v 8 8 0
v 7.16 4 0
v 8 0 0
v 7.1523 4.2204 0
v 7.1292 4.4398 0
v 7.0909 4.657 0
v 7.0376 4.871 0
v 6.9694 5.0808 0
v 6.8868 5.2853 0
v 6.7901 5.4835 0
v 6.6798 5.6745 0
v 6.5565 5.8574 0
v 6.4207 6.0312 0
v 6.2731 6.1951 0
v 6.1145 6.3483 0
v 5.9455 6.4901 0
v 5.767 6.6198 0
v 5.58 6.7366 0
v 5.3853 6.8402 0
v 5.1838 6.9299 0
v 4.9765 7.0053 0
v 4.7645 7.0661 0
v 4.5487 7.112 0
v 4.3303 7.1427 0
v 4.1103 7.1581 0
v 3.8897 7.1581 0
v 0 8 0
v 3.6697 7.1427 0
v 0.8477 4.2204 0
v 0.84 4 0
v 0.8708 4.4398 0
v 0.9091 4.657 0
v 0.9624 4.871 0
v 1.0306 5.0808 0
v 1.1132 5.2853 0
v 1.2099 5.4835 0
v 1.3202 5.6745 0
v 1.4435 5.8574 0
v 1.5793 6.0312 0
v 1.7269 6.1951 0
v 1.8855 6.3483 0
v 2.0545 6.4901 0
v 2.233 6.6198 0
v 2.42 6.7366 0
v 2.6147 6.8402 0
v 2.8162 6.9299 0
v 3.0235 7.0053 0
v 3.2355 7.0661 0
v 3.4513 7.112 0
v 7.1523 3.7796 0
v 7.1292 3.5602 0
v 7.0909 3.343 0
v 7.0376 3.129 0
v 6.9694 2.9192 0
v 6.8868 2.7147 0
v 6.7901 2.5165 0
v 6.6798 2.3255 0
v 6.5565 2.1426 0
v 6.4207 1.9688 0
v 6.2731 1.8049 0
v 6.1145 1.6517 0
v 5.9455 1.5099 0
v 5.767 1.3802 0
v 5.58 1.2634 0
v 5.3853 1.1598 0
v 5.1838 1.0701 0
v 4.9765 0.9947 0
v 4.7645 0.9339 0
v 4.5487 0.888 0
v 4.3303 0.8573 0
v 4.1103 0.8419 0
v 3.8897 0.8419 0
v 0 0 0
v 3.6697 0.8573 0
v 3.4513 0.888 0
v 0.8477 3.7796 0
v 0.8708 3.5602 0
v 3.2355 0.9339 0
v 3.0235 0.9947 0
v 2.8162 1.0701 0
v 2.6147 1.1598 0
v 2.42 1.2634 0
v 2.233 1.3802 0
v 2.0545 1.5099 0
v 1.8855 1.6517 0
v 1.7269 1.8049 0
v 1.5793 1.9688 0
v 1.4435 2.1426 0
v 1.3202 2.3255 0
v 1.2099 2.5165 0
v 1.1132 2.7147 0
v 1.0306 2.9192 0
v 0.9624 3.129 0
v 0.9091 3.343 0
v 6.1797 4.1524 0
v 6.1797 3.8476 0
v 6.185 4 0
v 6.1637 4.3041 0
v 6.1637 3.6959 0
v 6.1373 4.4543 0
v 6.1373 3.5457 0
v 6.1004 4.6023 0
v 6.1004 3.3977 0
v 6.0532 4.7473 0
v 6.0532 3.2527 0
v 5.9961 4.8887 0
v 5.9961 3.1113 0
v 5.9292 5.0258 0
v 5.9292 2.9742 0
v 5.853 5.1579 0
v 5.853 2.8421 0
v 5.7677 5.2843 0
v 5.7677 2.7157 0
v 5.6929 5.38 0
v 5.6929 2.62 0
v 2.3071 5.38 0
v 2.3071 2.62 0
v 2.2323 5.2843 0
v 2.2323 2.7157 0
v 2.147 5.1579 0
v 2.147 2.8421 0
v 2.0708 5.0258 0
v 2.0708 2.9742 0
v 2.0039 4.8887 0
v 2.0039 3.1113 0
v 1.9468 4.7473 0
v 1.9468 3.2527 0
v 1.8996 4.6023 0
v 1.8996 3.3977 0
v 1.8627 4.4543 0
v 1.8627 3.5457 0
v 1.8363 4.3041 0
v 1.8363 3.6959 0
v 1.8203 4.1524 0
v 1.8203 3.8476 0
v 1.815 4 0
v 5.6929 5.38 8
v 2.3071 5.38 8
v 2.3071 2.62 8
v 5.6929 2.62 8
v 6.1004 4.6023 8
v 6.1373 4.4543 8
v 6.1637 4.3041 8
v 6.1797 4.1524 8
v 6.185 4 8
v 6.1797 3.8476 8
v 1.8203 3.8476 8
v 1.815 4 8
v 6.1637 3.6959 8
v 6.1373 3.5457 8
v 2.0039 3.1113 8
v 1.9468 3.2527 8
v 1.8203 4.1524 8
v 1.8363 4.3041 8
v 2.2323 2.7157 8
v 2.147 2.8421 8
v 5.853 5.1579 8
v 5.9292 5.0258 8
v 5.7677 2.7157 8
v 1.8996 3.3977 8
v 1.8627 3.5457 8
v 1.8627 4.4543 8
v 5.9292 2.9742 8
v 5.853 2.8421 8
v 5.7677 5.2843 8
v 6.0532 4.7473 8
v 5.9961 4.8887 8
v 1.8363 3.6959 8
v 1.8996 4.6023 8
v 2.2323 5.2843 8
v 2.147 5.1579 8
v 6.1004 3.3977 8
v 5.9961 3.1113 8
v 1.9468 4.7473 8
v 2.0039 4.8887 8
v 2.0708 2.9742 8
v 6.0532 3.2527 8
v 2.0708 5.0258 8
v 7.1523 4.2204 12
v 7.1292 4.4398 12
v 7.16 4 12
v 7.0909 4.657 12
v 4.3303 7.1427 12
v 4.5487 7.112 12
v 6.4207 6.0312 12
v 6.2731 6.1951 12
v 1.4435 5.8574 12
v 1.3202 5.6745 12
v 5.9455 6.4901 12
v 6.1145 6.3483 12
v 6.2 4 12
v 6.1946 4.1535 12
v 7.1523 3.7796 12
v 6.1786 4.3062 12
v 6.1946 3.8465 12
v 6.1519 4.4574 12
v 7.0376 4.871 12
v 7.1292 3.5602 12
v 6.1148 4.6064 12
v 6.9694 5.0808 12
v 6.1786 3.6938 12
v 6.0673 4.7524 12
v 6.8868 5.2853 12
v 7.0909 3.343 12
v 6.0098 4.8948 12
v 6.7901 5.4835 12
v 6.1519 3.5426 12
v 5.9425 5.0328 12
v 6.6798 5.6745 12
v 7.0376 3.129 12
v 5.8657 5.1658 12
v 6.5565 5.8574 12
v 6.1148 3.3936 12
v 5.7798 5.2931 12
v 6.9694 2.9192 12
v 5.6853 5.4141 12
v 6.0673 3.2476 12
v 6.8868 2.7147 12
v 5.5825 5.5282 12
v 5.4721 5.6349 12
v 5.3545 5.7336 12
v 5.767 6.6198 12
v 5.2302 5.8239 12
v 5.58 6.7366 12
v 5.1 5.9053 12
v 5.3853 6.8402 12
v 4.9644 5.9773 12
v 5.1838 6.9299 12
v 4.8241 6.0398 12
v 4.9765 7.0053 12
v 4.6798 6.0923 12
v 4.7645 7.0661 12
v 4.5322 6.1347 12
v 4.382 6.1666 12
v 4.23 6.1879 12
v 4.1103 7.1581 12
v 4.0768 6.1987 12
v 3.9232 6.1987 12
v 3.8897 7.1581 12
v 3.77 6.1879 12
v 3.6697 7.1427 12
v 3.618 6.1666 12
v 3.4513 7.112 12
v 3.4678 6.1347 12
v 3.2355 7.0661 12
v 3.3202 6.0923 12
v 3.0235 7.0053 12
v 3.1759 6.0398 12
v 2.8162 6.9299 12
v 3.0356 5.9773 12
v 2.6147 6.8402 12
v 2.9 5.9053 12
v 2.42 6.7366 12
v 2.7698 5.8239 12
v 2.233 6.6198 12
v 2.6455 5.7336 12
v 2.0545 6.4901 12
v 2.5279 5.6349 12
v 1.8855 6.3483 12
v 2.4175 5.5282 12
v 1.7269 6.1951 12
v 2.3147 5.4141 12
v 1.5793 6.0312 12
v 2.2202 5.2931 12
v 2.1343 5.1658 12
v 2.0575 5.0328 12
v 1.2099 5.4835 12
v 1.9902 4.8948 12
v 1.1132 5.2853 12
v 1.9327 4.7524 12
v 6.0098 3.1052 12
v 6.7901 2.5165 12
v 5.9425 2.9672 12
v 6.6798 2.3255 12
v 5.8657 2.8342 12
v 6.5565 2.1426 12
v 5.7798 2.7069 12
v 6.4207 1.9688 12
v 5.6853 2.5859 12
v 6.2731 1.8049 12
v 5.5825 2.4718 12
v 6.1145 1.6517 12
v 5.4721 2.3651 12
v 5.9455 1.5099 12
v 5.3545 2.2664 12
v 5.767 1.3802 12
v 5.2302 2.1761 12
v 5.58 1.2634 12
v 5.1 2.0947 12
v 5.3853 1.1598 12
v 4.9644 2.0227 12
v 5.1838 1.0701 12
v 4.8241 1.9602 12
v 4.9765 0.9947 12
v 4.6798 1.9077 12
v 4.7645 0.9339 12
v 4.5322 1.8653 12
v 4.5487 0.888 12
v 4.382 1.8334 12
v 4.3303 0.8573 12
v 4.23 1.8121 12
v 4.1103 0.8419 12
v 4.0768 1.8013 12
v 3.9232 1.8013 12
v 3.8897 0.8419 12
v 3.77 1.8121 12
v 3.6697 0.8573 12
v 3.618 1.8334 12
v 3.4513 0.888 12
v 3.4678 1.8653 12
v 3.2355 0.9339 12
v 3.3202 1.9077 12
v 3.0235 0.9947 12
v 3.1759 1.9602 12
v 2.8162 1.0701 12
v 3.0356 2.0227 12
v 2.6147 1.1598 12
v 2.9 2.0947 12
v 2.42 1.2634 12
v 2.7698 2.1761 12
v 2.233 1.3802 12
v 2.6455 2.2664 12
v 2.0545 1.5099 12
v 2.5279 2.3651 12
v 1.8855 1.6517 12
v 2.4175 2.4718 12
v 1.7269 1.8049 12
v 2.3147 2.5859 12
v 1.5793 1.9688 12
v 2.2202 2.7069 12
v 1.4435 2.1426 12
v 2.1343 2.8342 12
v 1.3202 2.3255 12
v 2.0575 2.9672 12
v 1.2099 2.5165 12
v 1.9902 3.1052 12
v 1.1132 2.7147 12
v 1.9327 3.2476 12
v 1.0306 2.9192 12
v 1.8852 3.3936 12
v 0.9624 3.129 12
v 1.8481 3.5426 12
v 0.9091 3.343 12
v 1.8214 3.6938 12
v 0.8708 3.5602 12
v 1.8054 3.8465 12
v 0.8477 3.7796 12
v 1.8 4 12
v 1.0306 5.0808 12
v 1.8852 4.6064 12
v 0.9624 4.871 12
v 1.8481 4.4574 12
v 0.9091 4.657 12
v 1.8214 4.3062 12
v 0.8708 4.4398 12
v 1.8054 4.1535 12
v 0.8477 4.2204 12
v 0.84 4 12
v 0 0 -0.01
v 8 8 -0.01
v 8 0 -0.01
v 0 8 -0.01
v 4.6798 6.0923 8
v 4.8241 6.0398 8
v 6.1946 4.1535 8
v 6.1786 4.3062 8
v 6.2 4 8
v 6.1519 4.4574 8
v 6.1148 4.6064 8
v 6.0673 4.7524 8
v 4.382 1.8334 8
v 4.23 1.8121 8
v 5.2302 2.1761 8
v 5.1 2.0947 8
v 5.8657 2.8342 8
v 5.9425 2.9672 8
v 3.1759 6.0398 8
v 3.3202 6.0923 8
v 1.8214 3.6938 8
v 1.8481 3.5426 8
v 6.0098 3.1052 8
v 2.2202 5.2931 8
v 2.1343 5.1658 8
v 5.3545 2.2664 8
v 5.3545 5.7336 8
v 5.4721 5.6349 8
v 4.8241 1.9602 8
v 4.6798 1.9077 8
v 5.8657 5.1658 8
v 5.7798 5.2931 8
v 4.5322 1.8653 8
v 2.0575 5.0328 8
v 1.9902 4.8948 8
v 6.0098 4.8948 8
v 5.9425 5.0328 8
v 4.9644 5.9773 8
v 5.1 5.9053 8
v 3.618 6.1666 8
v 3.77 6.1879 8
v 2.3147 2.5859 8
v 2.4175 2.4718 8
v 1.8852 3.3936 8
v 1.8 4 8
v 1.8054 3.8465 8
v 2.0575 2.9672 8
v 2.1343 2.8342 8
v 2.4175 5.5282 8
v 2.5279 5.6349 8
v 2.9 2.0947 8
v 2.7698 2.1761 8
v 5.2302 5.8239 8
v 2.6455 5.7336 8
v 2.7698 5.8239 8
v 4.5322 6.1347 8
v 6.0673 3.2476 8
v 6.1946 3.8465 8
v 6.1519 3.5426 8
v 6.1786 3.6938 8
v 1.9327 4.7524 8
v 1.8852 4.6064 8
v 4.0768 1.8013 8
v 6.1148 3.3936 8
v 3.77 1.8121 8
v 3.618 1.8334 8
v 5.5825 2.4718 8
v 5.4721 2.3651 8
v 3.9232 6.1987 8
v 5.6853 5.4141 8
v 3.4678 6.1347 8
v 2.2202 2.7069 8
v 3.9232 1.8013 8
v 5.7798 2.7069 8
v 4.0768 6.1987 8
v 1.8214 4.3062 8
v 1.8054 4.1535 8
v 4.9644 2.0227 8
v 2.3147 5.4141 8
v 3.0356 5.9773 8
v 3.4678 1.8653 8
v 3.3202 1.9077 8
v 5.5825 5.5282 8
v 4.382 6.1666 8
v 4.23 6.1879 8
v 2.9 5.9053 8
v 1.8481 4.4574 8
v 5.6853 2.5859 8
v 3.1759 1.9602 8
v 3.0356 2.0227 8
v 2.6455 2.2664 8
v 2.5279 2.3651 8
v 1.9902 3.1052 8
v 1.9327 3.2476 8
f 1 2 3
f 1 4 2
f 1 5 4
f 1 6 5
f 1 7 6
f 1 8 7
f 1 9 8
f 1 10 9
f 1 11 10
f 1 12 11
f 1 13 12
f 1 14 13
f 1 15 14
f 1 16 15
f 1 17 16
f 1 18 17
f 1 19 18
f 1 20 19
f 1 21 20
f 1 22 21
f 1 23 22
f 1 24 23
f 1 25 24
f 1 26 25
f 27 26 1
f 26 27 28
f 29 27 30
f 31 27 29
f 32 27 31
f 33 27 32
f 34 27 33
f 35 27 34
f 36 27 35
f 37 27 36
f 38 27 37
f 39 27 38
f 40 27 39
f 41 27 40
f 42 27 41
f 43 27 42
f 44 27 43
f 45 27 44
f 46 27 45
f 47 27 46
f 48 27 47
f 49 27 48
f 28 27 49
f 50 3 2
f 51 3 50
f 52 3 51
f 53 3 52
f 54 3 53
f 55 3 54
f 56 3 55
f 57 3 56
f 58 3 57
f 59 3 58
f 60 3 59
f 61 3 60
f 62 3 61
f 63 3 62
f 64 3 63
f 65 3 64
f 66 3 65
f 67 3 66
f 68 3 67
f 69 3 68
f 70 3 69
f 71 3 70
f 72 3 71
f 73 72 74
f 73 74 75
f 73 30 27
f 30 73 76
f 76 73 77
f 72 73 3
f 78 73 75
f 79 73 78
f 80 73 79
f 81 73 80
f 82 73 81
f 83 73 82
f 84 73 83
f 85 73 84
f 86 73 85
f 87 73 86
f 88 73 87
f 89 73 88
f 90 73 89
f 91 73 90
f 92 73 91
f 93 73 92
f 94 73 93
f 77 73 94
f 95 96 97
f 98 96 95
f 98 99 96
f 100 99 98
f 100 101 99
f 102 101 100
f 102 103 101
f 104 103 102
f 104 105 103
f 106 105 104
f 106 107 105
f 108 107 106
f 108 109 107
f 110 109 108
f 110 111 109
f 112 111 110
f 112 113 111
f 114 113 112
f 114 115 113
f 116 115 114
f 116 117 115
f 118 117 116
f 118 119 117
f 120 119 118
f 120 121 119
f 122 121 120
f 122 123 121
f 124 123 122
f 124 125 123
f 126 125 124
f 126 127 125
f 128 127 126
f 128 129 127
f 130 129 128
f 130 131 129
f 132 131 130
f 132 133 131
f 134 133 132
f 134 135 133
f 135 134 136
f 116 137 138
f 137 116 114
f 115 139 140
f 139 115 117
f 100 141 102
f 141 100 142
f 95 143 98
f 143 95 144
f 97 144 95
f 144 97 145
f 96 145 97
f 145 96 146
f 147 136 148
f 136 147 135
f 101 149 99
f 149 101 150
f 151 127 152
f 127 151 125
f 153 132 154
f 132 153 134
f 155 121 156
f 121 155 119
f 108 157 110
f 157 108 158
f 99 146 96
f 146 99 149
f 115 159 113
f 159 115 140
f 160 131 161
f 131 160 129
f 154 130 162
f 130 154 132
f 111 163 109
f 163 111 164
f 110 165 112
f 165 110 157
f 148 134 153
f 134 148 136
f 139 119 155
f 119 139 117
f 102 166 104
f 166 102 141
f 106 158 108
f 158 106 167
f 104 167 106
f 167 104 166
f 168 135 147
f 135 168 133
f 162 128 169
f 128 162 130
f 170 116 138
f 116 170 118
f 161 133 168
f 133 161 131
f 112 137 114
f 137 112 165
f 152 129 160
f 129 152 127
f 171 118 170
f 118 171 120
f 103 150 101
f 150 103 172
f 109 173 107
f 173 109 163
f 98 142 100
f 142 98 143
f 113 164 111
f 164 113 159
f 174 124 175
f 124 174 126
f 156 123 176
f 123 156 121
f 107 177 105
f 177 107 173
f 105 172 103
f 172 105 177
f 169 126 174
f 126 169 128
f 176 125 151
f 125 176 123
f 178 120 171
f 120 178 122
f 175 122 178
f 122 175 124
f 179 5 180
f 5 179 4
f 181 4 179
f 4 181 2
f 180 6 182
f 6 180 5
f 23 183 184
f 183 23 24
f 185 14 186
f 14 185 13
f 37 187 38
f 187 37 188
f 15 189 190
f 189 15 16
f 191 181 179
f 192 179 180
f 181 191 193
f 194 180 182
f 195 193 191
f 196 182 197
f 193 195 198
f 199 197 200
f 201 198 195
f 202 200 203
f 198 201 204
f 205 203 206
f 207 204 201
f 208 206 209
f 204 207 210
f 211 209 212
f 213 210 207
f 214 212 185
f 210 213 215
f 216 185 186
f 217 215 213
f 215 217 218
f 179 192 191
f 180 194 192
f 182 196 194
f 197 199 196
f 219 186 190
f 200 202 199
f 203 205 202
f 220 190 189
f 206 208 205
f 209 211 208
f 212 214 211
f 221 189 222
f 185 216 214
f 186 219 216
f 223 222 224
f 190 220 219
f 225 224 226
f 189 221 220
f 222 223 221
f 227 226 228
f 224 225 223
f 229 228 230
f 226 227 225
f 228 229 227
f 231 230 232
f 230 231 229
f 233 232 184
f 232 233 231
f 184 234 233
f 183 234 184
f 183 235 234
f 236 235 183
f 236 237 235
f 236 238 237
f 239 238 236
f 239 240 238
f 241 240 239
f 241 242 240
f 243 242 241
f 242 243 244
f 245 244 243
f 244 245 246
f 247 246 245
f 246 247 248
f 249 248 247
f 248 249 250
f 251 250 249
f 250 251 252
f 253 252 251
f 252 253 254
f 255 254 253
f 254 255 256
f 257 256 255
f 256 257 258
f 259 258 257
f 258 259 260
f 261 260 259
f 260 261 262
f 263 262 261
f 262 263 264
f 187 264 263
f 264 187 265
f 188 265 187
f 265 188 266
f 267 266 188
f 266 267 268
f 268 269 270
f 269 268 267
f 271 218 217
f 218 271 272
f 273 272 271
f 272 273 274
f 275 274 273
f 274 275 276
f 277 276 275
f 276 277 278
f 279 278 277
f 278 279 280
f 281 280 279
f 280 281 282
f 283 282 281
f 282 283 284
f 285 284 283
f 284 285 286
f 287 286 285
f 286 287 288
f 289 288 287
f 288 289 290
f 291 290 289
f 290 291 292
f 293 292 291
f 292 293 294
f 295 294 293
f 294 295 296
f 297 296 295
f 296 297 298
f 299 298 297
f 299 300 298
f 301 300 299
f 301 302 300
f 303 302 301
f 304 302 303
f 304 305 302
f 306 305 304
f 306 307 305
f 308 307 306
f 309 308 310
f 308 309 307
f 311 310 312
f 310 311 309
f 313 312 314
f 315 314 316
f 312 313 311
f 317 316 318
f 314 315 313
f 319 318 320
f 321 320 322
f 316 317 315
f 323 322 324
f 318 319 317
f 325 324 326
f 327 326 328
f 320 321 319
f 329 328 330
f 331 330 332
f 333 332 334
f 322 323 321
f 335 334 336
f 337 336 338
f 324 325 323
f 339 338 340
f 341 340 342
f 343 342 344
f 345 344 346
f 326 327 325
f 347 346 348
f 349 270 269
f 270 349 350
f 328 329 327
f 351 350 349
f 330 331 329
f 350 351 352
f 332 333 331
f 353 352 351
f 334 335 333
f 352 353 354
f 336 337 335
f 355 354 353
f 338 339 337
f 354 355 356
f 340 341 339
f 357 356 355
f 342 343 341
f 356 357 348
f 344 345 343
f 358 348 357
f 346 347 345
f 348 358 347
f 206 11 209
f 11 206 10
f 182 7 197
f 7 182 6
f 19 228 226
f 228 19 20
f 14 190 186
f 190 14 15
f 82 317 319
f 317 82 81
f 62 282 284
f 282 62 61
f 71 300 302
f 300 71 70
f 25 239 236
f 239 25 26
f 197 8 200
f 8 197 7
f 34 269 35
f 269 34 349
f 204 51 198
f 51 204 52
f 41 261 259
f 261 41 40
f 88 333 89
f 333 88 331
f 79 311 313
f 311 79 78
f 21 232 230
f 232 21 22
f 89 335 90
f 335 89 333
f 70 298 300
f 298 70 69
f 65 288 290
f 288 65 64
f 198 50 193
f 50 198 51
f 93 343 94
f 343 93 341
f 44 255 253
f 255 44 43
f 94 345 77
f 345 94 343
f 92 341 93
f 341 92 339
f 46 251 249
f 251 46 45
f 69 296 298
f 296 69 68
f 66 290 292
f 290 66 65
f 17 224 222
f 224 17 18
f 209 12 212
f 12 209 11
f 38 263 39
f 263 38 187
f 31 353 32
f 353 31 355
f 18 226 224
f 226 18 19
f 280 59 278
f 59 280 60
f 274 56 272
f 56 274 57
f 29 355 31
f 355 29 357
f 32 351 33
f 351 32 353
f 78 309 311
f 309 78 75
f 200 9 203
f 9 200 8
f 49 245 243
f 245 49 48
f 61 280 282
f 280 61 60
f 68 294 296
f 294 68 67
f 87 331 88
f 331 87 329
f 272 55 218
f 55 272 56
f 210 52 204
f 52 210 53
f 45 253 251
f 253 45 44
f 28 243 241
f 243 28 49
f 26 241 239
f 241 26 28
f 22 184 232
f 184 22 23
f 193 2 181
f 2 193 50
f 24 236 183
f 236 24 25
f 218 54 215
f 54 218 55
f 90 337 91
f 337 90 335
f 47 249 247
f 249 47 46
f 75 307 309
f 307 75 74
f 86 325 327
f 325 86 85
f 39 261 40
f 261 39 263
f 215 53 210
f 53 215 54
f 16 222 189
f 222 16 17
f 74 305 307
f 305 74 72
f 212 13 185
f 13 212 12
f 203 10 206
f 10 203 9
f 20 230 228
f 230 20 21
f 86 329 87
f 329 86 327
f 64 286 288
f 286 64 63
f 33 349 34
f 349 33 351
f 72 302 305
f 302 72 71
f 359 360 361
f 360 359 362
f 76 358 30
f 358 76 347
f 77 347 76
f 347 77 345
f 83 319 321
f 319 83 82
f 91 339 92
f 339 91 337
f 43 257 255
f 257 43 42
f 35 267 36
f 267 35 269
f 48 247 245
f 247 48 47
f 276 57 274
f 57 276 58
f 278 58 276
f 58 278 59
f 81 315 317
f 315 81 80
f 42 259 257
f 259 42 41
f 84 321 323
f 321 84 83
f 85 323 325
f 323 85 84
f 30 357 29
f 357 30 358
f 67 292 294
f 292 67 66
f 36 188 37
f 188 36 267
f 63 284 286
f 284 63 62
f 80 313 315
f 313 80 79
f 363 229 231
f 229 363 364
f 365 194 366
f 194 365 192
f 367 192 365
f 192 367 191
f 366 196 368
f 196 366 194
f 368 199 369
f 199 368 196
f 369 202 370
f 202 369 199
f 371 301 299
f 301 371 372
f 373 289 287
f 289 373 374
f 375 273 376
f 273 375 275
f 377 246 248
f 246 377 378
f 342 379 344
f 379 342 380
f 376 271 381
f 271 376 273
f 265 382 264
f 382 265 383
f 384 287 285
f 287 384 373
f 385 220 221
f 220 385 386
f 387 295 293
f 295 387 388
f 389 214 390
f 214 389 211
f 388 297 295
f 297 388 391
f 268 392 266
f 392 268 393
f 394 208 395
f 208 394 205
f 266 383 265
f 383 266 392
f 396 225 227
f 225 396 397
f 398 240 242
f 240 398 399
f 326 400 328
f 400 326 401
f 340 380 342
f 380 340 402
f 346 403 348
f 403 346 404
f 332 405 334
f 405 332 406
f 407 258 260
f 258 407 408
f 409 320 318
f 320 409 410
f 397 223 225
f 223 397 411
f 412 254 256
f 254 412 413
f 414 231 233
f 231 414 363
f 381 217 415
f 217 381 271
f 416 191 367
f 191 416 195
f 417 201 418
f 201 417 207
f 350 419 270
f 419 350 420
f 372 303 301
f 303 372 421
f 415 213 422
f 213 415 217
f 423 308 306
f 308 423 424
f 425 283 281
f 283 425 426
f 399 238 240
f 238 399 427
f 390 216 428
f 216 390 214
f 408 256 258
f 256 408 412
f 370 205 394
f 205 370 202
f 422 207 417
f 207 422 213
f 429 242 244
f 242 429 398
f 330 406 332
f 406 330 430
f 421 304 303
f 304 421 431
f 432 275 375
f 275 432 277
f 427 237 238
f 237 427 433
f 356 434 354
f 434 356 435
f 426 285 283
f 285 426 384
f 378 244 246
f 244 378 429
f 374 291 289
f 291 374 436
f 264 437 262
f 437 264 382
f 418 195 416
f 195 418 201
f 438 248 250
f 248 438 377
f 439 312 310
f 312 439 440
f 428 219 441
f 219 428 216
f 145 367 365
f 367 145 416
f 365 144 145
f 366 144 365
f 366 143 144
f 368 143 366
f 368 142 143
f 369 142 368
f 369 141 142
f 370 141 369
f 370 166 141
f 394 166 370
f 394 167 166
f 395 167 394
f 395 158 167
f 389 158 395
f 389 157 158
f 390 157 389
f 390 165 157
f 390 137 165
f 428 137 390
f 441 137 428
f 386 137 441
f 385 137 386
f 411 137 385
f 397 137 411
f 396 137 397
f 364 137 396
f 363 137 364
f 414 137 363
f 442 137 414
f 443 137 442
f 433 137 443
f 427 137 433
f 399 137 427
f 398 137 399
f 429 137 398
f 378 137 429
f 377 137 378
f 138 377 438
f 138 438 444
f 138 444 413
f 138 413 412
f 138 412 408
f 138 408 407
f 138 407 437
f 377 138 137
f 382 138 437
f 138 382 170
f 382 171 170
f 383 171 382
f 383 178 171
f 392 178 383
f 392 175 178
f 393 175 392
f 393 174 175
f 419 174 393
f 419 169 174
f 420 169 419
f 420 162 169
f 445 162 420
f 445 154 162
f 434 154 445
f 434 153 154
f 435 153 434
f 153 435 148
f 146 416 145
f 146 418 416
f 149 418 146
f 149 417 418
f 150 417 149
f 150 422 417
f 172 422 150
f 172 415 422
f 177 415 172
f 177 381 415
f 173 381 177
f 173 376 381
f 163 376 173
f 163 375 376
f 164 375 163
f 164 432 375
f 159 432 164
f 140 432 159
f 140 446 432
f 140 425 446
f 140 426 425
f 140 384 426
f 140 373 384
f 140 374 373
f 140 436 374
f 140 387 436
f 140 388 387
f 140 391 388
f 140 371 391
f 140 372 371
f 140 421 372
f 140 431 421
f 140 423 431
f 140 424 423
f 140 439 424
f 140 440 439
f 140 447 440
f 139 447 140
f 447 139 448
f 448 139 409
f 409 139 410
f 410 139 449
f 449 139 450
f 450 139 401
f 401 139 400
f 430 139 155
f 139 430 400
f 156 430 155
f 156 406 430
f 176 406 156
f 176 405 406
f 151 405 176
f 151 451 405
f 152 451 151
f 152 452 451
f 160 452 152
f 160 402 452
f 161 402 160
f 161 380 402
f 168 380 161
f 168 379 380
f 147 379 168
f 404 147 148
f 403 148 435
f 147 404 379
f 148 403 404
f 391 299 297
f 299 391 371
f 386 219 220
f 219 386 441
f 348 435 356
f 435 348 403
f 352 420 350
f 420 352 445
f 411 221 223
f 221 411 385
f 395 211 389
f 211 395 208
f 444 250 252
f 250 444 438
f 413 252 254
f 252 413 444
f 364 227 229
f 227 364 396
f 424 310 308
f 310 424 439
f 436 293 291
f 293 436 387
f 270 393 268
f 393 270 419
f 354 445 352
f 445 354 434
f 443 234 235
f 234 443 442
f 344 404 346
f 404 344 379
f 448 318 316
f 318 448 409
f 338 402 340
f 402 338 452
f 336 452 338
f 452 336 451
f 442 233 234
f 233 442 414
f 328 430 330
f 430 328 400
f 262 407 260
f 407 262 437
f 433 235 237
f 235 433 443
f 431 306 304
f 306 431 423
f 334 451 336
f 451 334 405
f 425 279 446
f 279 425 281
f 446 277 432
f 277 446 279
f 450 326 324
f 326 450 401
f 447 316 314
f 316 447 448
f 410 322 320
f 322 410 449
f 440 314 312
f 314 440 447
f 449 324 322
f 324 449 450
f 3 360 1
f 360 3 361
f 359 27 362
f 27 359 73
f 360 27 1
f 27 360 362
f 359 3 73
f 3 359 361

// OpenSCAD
// file: ../Base/PlacementOptions.scad
// Fischertechnik Box Foundation
// Placement Options

// Alignment
NoAlign = 0;
AlignLeft = 1;
AlignBottom = 2;
AlignCenter = 3;
AlignRight = 4;
AlignTop = 5;

// Element rotation degree steps
rotations = [0, -90, -180, -270];

// Rotation
NoRotation = 0;
Rotate0 = 0;
Rotate90 = 1;
Rotate180 = 2;
Rotate270 = 3;

// Docking (seen from above)
NoDock = -1;
DockLeft = 0;
DockTop = 1;
DockRight = 2;
DockCorner = 2;
DockBottom = 3;

// Web corners
LowerLeft = 0;
UpperLeft = 1;
UpperRight = 2;
LowerRight = 3;

// Web position relative to corner
LeftOfCorner = 0;
RightOfCorner = 1;

// Rails direction
Horizontal = true;
Vertical = false;
// file: ../Base/Boxes.scad
// Fischertechnik Box Foundation
// Pre-designed Boxes

use <Constants.scad>

include <PlacementOptions.scad>

box190Width = 190;
box190Depth = 130;
box130Width = 130;
box130Depth = 95;

// Values are from an original ec3 box
topBottomDifference = 1.5;
outerHeight = 40;
baseThickness = 1.8;
innerHeight = outerHeight - baseThickness;
stackExcess = 5.7;
radius = 3.5;
wallThickness = 1.5;
tolerance = 0.2;

boxWallThickness = wallThickness;
boxBaseThickness = baseThickness;
boxWebWidth = 3.0;

// getBoxWallThickness()
// Gets the wall thickness of a Fischertechnik Box
function getBoxWallThickness() = boxWallThickness;

// getBoxUsageHeight(height = 38.2)
// Gets the usable height of a Fischertechnik box
// height = Outer height of the box from the bottom to the upper edge.
function getBoxUsageHeight(height = outerHeight) = height - baseThickness - stackExcess;

// getBoxInnerHeight()
// Gets the inner height of a Fischertechnik box, including the stack excess
function getBoxInnerHeight() = innerHeight;

// getBoxBaseThickness()
// Gets the thickness of the Fischertechnik box base.
function getBoxBaseThickness() = boxBaseThickness;

// getBoxWebWidth()
// Gets the width of a box web
function getBoxWebWidth() = boxWebWidth;

// getBox190Space()
// Gets the usable inner space of a Box 190 as an x/y-list
function getBox190Space() = [
    box190Width - 2*getBoxWallThickness() - topBottomDifference, 
    box190Depth - 2*getBoxWallThickness() - topBottomDifference ];

// RoundedCornerPlate(width, depth, height, radius)
// Creates a body plate with rounded corners for a box. Used
// also to create the complete box with the hull module.
// width = Width of the plate
// depth = depth of the plate 
// height = thickness of the plate
// radius = radius of the rounded corner
module RoundedCornerPlate(width, depth, height, radius) {
    translate([radius, radius])
    hull() {
        w = width-2*radius;
        d = depth-2*radius;
        cube([w, d, height]);
        cylinder(height, r=radius, $fn=getFragments());
        translate([w, 0])
            cylinder(height, r=radius, $fn=getFragments());
        translate([w, d])
            cylinder(height, r=radius, $fn=getFragments());
        translate([0, d])
            cylinder(height, r=radius, $fn=getFragments());
    }
}

// BoxBase(width, depth)
// Creates an empty stackable Fischertechnik compatible box
// width = Outer width of the box (190, 130, ...)
// depth = Outer depth of the box (130, 95, ...)

module BoxBase(width, depth, height=outerHeight) {    
    thinPlate = 0.01;

    innerHeight = height - baseThickness;    
    
    module Body(tolerance=tolerance) {
        hull() {
            // Bottom with tolerance to fit into the original boxes when stacked
            translate([-wallThickness+tolerance, -wallThickness+tolerance, -baseThickness])
                RoundedCornerPlate(width-topBottomDifference-2*tolerance, depth-topBottomDifference-2*tolerance, thinPlate, radius);
            
            // Top
            translate([-wallThickness-topBottomDifference/2, -wallThickness-topBottomDifference/2, innerHeight-thinPlate])
                RoundedCornerPlate(width, depth, thinPlate, radius);
         }
    }

    module Cutoff() {
        hull() {
            coWidth = width - 2*wallThickness;
            coDepth = depth - 2*wallThickness;
            
            // Bottom
            RoundedCornerPlate(coWidth-topBottomDifference, coDepth-topBottomDifference, thinPlate, radius);

            // Top
            translate([-topBottomDifference/2, -topBottomDifference/2, innerHeight+thinPlate]) 
                RoundedCornerPlate(coWidth, coDepth, thinPlate, radius);
        }
    }
    
    difference() {        
        Body();
        Cutoff();
        stackOffset = innerHeight - stackExcess;
        translate([0, 0, stackOffset + baseThickness])
            Body(tolerance=0);
    }
}

// Creates the Fischertechnik empty box 130x190 mm and places it at position 0,0
// 190x130 are the outer sizes, the inner space is slightly smaller. Use getBox190Space() to get the inner sizes.
// The box is positioned that the usable inner space is at the 0,0,0 position.

module Box190() {
    BoxBase(box190Width, box190Depth);
}

// Gets the usable inner space of a Box 130 as an x/y-list
function getBox130Space() = [
    box130Width - 2*getBoxWallThickness() - topBottomDifference, 
    box130Depth - 2*getBoxWallThickness() - topBottomDifference ];

// Creates the Fischertechnik empty box 95x130 mm and places it at position 0,0
// 190x130 are the outer sizes, the inner space is slightly smaller. Use getBox190Space() to get the inner sizes.
// The box is positioned that the usable inner space is at the 0,0,0 position.

module Box130() {
    BoxBase(box130Width, box130Depth);
}

// Creates a web at the specified box walls
// corner 0 = LowerLeft, 1 = UpperLeft, 2 = UpperRight, 3 = LowerRight
// side 0 = LeftOfCorner, 1 = RightOfCorner
// distance = Distance in mm from the corner
// boxSpace = inner width and depth of the box (default: Box 190)
// webWidth = length of the web (default is 3 mms)
// webThickness = thickness of the web (default is 1 mm)
// height = Height of the web (standard is getBoxUsageHeight())
// sink = How much of the web is sunk into the wall

module BoxWeb(
    corner, 
    side, 
    distance, 
    boxSpace=getBox190Space(), 
    webWidth=getBoxWebWidth(), 
    webThickness=1.0, 
    height=getBoxUsageHeight(),
    sink = getBoxWallThickness()/2) {
    width = (corner % 2 == 0) ? 
            (side == LeftOfCorner ? webWidth : webThickness) :
            (side == LeftOfCorner ? webThickness : webWidth);

    depth = (corner % 2 == 0) ? 
            (side == RightOfCorner ? webWidth : webThickness) :
            (side == RightOfCorner ? webThickness : webWidth);
    
    xDiff = corner == LowerLeft ? 
                (side == LeftOfCorner ? -sink : distance) :
            (corner == UpperLeft ?                
                (side == LeftOfCorner ? distance : -sink) :
            (corner == UpperRight ?
                (side == LeftOfCorner ? boxSpace.x-webWidth+sink : boxSpace.x-distance-webThickness) :
                (side == LeftOfCorner ? boxSpace.x-distance-webThickness: boxSpace.x-webWidth+sink)));

    yDiff = corner == LowerLeft ? 
                (side == RightOfCorner ? -sink : distance) :
            (corner == UpperLeft ?
                (side == RightOfCorner ? boxSpace.y-distance-webThickness : boxSpace.y-webWidth+sink) :
            (corner == UpperRight ?
                (side == RightOfCorner ? boxSpace.y-webWidth+sink : boxSpace.y-distance-webThickness) :
                (side == RightOfCorner ? distance : -sink)));
    
    translate([xDiff, yDiff, -getExcess()])
        cube([width, depth, height + 2*getExcess()]);
}
// file: ../Base/Rotation.scad
// Fischertechnik Box Foundation
// Geometry Helpers Rotation

include <PlacementOptions.scad>

// getRotatedSpace(space, rotation=NoRotation)
// Rotates the space dependent on the specified rotation

function getRotatedSpace(space, rotation=NoRotation) = [
    (rotation == Rotate90 || rotation == Rotate270) ? space.y : space.x,
    (rotation == Rotate90 || rotation == Rotate270) ? space.x : space.y
];

// Rotates the given space around the fixed left lower corner
// space = the space the children needs as width/depth list [width,depth]
// rotation = 0 Rotate0 degrees, 1 Rotate90 degrees, 2 Rotate180 degrees, 3 Rotate270 degrees (equivalent to -90)

module RotateFix(space, rotation=NoRotation) {
    dy = (rotation == Rotate0 || rotation == Rotate270) ? 0 :
        (rotation == Rotate90) ? space.x :
        space.y;
    dx = (rotation < Rotate180) ? 0 :
        (rotation == Rotate180) ? space.x :
        space.y;
    
    translate([dx, dy, 0])
        rotate([0, 0, rotations[rotation]])
            children();
}
// file: ../Base/Alignment.scad
// Fischertechnik Box Foundation
// Geometry Helpers Alignment

include <PlacementOptions.scad>

// getAlignedX(elementWidth, spaceWidth, align=AlignRight, offset=0)
// Gets the aligned X offset of an element with the given
// width in the given space.
// elementWidth = The width of the element to positon
// spaceWidth = The space where the element should be aligned
// align = 0 AlignLeft, 1 AlignCenter, 2 AlignRight
// offset = an optional offset from the aligned position. When
// aligned left or centered, then positive values are in X direction.
// When aligned right then positive values are in negative X direction.

function getAlignedX(elementWidth, spaceWidth, align=AlignRight, offset=0) =
    (align == AlignLeft) ?
        offset :
        ((align == AlignCenter) ?
        (spaceWidth - elementWidth)/2 + offset :
        spaceWidth - offset - elementWidth);

// getAlignedY(elementDepth, spaceDepth, align=AlignTop, offset=0)
// Gets the aligned Y offset of an element with the given
// depth in the given space.
// elementDepth = The depth of the element to positon
// spaceDepth = The space where the element should be aligned
// align = 0 AlignBottom, 1 AlignCenter, 2 AlignTop
// offset = an optional offset from the aligned position. When
// aligned bottom or centered, then positive values are in Y direction.
// When aligned top then positive values are in negative Y direction.

function getAlignedY(elementDepth, spaceDepth, align=AlignTop, offset=0) =
    (align == AlignBottom) ?
        offset :
        ((align == AlignCenter) ?
        (spaceDepth - elementDepth)/2 + offset :
        spaceDepth - offset - elementDepth);
// file: ../Base/Placement.scad
// Fischertechnik Box Foundation
// Geometry Helpers Placement

use <Constants.scad>
use <Alignment.scad>
use <Rotation.scad>
use <Boxes.scad>

include <PlacementOptions.scad>

// Place(x=0, y=0, elementSpace=[0,0], alignX=AlignLeft, alignY=AlignBottom, rotation=Rotate0, boxSpace=getBox190Space())
// Places the child at the specified position
// y = Y-Position. This is a relative position when an X aligment is specified.
// x = X-Position. This is a relative position when an Y aligment is specified.
// elementSpace = space of the element to be placed [x,y]
// alignX = -1=NoAlign, 0 AlignLeft, 1 AlignCenter, 3 AlignRight (elementSpace and boxSpace required!)
// alignY = -1=NoAlign, 2 AlignBottom, 1 AlignCenter, 4 AlignTop (elementSpace and boxSpace required!)
// rotation = 0 Rotate0 0 degrees, 1 Rotate90 90 degrees, 
// 2 Rotate180 180 degrees, 3 Rotate270 270 degrees (equivalent to -90)
// boxSpace = Inner space of the box where the placement occurs [x,y] - default is Box 190x130 inner space

module Place(x=0, y=0, elementSpace=[0,0], 
  alignX=AlignLeft, alignY=AlignBottom, 
  rotation=NoRotation, boxSpace=getBox190Space()) {

    module Position(x, y, space, rotation=Rotate0) {
        translate([x, y, 0])
            RotateFix(space, rotation)
                children();
    }

    space = getRotatedSpace(elementSpace, rotation);
    alignedX = getAlignedX(space.x, boxSpace.x, alignX, x);
    alignedY = getAlignedY(space.y, boxSpace.y, alignY, y);
    Position(alignedX, alignedY, elementSpace, rotation)
        children();
}

// Center(space=getBox130Space(), elementSpace=[0,0])
// space = Space where the children is centered. For cylinder use centered=true and no elementSpace.
// elementSpace = space of the element to be centered [x,y]

module Center(space=getBox190Space(), elementSpace=[0,0]) {
    Place(elementSpace=elementSpace, boxSpace=space, alignX=AlignCenter, alignY=AlignCenter)
        children();
}

// CenterHorizontal(width=0, y=0, offset=0, space=getBox130Space())
// width = Width of the element to be placed.
// y = Y position of the element
// offset = Offset from the center position (negative will be left of the center)
// space = Space where the element is placed

module CenterHorizontal(width=0, y=0, offset=0, space=getBox190Space()) {
    Place(x=offset, y=y, elementSpace=[width, 0], boxSpace=space, alignX=AlignCenter)
        children(0);
}

// CenterVertical(depth=0, x=0, offset=0, space=getBox130Space())
// depth = Depth of the element to be placed.
// x = X position of the element
// offset = Offset from the center position (negative will be down of the center)
// space = Space where the element is placed

module CenterVertical(depth=0, x=0, offset=0, space=getBox190Space()) {
    Place(x=x, y=offset, elementSpace=[0, depth], boxSpace=space, alignY=AlignCenter)
        children(0);
}

// getIsVertical(align)
// True if the specified alignment needs a vertical orientation for a divider (AlignRight, AlignLeft)

function getIsVertical(align) = (align == AlignRight || align == AlignLeft);

// getIsHorizontal(align)
// True if the specified alignment needs a horizontal orientation for a divider (AlignTop, AlignBottom)

function getIsHorizontal(align) = (align == AlignTop || align == AlignBottom);
// file: ../Base/Constants.scad
// Fischertechnik Box Foundation
// Constants

// Constant values necessary for multiple elements

// Base constants
dividerThickness = 1.2;
excess = 0.01;
fragments = 90;
tolerance = 0.8;

// Gets the thickness of a divider 
function getDividerThickness() = dividerThickness;

// Gets the excess that is used to merge walls into each other
function getExcess() = excess;

// Gets amount of fragments of a cylinder
function getFragments() = fragments;

// Gets the inner tolerance of a frame to each side
function getTolerance() = tolerance;


// Fischertechnik specific constants
axisDiameter = 4;
axisBottomDiameter = axisDiameter + 1;
axisTolerance = 0.2;
axisLockingLength = 8;

// Gets axis diameter of Fischertechnik axis
function getAxisDiameter() = axisDiameter;

// Gets axis diameter tolerance (subtracted for element axis)
function getAxisTolerance() = axisTolerance;

// Gets the axis diameter for standing axis
function getStandAxisDiameter() = getAxisDiameter() - getAxisTolerance();

// Gets axis bottom diameter for thicker part at the bottom
function getAxisBottomDiameter() = axisBottomDiameter;

// Gets the lengthh of the locking part of a locking axis
function getAxisLockingLength() = axisLockingLength;

// Studs

studHeight = 2.5;
studTolerance = 0.2;
studRailDistance = 9;   // as in ft 50

// gets the height of a connecting stud
function getStudHeight() = studHeight;

// gets the connecting stud height tolerance
function getStudTolerance() = studTolerance;

// gets the default rail distance for studs
function getStudRailDistance() = studRailDistance;

// Dockable Frame with Edge

standardEdgeDistance = 2.5;
standardWebDistance = 11.5;
standardCornerLength = 15;

// gets the standard distance to the wall of the box for dockable frames with webs
function getStandardEdgeDistance() = standardEdgeDistance;

// gets the standard distance of each web to the corner of the dockable frame
function getStandardWebDistance() = standardWebDistance;

// gets the standard length of the corner walls of a dockable frame
function getStandardCornerLength() = standardCornerLength;

// Tubes

tubeWallFactor = 0.8;

// gets the wall thickness of a tube.
function getTubeWallThickness() = tubeWallFactor * getDividerThickness();

// Small Parts and Divider Frame

smallPartsFrameHeight = 20;

// gets the frame height for docked small parts boxes.
function getSmallPartsFrameHeight() = smallPartsFrameHeight;

// Hubs

hubRingDiameter = 19.5;
hubRingLevelDiameter = 21;

// gets the diameter of a tube matching the inner ring of a wheel
function getHubRingDiameter() = hubRingDiameter;

// gets the diameter of a hub tube with a thicker diameter
function getHubRingLevelDiameter() = hubRingLevelDiameter;

// Struts

strutAddLength = 9.0;
strutDepth = 8.0;

// gets the full length of a strut
function getFullStrutLength(length) = length + strutAddLength;

// gets the radius of the end of a strut
function getStrutEndRadius() = strutAddLength / 2;

// gets the the depth of a strut
function getStrutDepth() = strutDepth;

// Propeller

propellerAxisDiameter = 7.0;
propellerAxisTolerance = 0.2;

// gets the propeller axis outer diameter
function getPropellerAxisDiameter() = propellerAxisDiameter;

// gets the propeller axis printing tolerance
function getPropellerAxisTolerance() = propellerAxisTolerance;
// main file
// Fischertechnik Box Library
// Cylinder for standing locking axis 30
// 35063

use <../Base/Constants.scad>
use <../Base/Placement.scad>
use <../ModelBase/Simple.scad>

/* [Hidden] */
width = 8;
depth = 8;
height = 12;

// getCylinderLockingAxis30Space()
// Gets the space the cylinder for a 30 mm axis needs

function getCylinderLockingAxis30Space() = [width, depth, height];

// CylinderLockingAxis30()
// Standing cylinder for locking axis 30
// 35063

module CylinderLockingAxis30() {
    Space(getCylinderLockingAxis30Space());
    
    Center(getCylinderLockingAxis30Space())
        LockingTube(height);
}

// Tests
color("lightgray")
CylinderLockingAxis30();
